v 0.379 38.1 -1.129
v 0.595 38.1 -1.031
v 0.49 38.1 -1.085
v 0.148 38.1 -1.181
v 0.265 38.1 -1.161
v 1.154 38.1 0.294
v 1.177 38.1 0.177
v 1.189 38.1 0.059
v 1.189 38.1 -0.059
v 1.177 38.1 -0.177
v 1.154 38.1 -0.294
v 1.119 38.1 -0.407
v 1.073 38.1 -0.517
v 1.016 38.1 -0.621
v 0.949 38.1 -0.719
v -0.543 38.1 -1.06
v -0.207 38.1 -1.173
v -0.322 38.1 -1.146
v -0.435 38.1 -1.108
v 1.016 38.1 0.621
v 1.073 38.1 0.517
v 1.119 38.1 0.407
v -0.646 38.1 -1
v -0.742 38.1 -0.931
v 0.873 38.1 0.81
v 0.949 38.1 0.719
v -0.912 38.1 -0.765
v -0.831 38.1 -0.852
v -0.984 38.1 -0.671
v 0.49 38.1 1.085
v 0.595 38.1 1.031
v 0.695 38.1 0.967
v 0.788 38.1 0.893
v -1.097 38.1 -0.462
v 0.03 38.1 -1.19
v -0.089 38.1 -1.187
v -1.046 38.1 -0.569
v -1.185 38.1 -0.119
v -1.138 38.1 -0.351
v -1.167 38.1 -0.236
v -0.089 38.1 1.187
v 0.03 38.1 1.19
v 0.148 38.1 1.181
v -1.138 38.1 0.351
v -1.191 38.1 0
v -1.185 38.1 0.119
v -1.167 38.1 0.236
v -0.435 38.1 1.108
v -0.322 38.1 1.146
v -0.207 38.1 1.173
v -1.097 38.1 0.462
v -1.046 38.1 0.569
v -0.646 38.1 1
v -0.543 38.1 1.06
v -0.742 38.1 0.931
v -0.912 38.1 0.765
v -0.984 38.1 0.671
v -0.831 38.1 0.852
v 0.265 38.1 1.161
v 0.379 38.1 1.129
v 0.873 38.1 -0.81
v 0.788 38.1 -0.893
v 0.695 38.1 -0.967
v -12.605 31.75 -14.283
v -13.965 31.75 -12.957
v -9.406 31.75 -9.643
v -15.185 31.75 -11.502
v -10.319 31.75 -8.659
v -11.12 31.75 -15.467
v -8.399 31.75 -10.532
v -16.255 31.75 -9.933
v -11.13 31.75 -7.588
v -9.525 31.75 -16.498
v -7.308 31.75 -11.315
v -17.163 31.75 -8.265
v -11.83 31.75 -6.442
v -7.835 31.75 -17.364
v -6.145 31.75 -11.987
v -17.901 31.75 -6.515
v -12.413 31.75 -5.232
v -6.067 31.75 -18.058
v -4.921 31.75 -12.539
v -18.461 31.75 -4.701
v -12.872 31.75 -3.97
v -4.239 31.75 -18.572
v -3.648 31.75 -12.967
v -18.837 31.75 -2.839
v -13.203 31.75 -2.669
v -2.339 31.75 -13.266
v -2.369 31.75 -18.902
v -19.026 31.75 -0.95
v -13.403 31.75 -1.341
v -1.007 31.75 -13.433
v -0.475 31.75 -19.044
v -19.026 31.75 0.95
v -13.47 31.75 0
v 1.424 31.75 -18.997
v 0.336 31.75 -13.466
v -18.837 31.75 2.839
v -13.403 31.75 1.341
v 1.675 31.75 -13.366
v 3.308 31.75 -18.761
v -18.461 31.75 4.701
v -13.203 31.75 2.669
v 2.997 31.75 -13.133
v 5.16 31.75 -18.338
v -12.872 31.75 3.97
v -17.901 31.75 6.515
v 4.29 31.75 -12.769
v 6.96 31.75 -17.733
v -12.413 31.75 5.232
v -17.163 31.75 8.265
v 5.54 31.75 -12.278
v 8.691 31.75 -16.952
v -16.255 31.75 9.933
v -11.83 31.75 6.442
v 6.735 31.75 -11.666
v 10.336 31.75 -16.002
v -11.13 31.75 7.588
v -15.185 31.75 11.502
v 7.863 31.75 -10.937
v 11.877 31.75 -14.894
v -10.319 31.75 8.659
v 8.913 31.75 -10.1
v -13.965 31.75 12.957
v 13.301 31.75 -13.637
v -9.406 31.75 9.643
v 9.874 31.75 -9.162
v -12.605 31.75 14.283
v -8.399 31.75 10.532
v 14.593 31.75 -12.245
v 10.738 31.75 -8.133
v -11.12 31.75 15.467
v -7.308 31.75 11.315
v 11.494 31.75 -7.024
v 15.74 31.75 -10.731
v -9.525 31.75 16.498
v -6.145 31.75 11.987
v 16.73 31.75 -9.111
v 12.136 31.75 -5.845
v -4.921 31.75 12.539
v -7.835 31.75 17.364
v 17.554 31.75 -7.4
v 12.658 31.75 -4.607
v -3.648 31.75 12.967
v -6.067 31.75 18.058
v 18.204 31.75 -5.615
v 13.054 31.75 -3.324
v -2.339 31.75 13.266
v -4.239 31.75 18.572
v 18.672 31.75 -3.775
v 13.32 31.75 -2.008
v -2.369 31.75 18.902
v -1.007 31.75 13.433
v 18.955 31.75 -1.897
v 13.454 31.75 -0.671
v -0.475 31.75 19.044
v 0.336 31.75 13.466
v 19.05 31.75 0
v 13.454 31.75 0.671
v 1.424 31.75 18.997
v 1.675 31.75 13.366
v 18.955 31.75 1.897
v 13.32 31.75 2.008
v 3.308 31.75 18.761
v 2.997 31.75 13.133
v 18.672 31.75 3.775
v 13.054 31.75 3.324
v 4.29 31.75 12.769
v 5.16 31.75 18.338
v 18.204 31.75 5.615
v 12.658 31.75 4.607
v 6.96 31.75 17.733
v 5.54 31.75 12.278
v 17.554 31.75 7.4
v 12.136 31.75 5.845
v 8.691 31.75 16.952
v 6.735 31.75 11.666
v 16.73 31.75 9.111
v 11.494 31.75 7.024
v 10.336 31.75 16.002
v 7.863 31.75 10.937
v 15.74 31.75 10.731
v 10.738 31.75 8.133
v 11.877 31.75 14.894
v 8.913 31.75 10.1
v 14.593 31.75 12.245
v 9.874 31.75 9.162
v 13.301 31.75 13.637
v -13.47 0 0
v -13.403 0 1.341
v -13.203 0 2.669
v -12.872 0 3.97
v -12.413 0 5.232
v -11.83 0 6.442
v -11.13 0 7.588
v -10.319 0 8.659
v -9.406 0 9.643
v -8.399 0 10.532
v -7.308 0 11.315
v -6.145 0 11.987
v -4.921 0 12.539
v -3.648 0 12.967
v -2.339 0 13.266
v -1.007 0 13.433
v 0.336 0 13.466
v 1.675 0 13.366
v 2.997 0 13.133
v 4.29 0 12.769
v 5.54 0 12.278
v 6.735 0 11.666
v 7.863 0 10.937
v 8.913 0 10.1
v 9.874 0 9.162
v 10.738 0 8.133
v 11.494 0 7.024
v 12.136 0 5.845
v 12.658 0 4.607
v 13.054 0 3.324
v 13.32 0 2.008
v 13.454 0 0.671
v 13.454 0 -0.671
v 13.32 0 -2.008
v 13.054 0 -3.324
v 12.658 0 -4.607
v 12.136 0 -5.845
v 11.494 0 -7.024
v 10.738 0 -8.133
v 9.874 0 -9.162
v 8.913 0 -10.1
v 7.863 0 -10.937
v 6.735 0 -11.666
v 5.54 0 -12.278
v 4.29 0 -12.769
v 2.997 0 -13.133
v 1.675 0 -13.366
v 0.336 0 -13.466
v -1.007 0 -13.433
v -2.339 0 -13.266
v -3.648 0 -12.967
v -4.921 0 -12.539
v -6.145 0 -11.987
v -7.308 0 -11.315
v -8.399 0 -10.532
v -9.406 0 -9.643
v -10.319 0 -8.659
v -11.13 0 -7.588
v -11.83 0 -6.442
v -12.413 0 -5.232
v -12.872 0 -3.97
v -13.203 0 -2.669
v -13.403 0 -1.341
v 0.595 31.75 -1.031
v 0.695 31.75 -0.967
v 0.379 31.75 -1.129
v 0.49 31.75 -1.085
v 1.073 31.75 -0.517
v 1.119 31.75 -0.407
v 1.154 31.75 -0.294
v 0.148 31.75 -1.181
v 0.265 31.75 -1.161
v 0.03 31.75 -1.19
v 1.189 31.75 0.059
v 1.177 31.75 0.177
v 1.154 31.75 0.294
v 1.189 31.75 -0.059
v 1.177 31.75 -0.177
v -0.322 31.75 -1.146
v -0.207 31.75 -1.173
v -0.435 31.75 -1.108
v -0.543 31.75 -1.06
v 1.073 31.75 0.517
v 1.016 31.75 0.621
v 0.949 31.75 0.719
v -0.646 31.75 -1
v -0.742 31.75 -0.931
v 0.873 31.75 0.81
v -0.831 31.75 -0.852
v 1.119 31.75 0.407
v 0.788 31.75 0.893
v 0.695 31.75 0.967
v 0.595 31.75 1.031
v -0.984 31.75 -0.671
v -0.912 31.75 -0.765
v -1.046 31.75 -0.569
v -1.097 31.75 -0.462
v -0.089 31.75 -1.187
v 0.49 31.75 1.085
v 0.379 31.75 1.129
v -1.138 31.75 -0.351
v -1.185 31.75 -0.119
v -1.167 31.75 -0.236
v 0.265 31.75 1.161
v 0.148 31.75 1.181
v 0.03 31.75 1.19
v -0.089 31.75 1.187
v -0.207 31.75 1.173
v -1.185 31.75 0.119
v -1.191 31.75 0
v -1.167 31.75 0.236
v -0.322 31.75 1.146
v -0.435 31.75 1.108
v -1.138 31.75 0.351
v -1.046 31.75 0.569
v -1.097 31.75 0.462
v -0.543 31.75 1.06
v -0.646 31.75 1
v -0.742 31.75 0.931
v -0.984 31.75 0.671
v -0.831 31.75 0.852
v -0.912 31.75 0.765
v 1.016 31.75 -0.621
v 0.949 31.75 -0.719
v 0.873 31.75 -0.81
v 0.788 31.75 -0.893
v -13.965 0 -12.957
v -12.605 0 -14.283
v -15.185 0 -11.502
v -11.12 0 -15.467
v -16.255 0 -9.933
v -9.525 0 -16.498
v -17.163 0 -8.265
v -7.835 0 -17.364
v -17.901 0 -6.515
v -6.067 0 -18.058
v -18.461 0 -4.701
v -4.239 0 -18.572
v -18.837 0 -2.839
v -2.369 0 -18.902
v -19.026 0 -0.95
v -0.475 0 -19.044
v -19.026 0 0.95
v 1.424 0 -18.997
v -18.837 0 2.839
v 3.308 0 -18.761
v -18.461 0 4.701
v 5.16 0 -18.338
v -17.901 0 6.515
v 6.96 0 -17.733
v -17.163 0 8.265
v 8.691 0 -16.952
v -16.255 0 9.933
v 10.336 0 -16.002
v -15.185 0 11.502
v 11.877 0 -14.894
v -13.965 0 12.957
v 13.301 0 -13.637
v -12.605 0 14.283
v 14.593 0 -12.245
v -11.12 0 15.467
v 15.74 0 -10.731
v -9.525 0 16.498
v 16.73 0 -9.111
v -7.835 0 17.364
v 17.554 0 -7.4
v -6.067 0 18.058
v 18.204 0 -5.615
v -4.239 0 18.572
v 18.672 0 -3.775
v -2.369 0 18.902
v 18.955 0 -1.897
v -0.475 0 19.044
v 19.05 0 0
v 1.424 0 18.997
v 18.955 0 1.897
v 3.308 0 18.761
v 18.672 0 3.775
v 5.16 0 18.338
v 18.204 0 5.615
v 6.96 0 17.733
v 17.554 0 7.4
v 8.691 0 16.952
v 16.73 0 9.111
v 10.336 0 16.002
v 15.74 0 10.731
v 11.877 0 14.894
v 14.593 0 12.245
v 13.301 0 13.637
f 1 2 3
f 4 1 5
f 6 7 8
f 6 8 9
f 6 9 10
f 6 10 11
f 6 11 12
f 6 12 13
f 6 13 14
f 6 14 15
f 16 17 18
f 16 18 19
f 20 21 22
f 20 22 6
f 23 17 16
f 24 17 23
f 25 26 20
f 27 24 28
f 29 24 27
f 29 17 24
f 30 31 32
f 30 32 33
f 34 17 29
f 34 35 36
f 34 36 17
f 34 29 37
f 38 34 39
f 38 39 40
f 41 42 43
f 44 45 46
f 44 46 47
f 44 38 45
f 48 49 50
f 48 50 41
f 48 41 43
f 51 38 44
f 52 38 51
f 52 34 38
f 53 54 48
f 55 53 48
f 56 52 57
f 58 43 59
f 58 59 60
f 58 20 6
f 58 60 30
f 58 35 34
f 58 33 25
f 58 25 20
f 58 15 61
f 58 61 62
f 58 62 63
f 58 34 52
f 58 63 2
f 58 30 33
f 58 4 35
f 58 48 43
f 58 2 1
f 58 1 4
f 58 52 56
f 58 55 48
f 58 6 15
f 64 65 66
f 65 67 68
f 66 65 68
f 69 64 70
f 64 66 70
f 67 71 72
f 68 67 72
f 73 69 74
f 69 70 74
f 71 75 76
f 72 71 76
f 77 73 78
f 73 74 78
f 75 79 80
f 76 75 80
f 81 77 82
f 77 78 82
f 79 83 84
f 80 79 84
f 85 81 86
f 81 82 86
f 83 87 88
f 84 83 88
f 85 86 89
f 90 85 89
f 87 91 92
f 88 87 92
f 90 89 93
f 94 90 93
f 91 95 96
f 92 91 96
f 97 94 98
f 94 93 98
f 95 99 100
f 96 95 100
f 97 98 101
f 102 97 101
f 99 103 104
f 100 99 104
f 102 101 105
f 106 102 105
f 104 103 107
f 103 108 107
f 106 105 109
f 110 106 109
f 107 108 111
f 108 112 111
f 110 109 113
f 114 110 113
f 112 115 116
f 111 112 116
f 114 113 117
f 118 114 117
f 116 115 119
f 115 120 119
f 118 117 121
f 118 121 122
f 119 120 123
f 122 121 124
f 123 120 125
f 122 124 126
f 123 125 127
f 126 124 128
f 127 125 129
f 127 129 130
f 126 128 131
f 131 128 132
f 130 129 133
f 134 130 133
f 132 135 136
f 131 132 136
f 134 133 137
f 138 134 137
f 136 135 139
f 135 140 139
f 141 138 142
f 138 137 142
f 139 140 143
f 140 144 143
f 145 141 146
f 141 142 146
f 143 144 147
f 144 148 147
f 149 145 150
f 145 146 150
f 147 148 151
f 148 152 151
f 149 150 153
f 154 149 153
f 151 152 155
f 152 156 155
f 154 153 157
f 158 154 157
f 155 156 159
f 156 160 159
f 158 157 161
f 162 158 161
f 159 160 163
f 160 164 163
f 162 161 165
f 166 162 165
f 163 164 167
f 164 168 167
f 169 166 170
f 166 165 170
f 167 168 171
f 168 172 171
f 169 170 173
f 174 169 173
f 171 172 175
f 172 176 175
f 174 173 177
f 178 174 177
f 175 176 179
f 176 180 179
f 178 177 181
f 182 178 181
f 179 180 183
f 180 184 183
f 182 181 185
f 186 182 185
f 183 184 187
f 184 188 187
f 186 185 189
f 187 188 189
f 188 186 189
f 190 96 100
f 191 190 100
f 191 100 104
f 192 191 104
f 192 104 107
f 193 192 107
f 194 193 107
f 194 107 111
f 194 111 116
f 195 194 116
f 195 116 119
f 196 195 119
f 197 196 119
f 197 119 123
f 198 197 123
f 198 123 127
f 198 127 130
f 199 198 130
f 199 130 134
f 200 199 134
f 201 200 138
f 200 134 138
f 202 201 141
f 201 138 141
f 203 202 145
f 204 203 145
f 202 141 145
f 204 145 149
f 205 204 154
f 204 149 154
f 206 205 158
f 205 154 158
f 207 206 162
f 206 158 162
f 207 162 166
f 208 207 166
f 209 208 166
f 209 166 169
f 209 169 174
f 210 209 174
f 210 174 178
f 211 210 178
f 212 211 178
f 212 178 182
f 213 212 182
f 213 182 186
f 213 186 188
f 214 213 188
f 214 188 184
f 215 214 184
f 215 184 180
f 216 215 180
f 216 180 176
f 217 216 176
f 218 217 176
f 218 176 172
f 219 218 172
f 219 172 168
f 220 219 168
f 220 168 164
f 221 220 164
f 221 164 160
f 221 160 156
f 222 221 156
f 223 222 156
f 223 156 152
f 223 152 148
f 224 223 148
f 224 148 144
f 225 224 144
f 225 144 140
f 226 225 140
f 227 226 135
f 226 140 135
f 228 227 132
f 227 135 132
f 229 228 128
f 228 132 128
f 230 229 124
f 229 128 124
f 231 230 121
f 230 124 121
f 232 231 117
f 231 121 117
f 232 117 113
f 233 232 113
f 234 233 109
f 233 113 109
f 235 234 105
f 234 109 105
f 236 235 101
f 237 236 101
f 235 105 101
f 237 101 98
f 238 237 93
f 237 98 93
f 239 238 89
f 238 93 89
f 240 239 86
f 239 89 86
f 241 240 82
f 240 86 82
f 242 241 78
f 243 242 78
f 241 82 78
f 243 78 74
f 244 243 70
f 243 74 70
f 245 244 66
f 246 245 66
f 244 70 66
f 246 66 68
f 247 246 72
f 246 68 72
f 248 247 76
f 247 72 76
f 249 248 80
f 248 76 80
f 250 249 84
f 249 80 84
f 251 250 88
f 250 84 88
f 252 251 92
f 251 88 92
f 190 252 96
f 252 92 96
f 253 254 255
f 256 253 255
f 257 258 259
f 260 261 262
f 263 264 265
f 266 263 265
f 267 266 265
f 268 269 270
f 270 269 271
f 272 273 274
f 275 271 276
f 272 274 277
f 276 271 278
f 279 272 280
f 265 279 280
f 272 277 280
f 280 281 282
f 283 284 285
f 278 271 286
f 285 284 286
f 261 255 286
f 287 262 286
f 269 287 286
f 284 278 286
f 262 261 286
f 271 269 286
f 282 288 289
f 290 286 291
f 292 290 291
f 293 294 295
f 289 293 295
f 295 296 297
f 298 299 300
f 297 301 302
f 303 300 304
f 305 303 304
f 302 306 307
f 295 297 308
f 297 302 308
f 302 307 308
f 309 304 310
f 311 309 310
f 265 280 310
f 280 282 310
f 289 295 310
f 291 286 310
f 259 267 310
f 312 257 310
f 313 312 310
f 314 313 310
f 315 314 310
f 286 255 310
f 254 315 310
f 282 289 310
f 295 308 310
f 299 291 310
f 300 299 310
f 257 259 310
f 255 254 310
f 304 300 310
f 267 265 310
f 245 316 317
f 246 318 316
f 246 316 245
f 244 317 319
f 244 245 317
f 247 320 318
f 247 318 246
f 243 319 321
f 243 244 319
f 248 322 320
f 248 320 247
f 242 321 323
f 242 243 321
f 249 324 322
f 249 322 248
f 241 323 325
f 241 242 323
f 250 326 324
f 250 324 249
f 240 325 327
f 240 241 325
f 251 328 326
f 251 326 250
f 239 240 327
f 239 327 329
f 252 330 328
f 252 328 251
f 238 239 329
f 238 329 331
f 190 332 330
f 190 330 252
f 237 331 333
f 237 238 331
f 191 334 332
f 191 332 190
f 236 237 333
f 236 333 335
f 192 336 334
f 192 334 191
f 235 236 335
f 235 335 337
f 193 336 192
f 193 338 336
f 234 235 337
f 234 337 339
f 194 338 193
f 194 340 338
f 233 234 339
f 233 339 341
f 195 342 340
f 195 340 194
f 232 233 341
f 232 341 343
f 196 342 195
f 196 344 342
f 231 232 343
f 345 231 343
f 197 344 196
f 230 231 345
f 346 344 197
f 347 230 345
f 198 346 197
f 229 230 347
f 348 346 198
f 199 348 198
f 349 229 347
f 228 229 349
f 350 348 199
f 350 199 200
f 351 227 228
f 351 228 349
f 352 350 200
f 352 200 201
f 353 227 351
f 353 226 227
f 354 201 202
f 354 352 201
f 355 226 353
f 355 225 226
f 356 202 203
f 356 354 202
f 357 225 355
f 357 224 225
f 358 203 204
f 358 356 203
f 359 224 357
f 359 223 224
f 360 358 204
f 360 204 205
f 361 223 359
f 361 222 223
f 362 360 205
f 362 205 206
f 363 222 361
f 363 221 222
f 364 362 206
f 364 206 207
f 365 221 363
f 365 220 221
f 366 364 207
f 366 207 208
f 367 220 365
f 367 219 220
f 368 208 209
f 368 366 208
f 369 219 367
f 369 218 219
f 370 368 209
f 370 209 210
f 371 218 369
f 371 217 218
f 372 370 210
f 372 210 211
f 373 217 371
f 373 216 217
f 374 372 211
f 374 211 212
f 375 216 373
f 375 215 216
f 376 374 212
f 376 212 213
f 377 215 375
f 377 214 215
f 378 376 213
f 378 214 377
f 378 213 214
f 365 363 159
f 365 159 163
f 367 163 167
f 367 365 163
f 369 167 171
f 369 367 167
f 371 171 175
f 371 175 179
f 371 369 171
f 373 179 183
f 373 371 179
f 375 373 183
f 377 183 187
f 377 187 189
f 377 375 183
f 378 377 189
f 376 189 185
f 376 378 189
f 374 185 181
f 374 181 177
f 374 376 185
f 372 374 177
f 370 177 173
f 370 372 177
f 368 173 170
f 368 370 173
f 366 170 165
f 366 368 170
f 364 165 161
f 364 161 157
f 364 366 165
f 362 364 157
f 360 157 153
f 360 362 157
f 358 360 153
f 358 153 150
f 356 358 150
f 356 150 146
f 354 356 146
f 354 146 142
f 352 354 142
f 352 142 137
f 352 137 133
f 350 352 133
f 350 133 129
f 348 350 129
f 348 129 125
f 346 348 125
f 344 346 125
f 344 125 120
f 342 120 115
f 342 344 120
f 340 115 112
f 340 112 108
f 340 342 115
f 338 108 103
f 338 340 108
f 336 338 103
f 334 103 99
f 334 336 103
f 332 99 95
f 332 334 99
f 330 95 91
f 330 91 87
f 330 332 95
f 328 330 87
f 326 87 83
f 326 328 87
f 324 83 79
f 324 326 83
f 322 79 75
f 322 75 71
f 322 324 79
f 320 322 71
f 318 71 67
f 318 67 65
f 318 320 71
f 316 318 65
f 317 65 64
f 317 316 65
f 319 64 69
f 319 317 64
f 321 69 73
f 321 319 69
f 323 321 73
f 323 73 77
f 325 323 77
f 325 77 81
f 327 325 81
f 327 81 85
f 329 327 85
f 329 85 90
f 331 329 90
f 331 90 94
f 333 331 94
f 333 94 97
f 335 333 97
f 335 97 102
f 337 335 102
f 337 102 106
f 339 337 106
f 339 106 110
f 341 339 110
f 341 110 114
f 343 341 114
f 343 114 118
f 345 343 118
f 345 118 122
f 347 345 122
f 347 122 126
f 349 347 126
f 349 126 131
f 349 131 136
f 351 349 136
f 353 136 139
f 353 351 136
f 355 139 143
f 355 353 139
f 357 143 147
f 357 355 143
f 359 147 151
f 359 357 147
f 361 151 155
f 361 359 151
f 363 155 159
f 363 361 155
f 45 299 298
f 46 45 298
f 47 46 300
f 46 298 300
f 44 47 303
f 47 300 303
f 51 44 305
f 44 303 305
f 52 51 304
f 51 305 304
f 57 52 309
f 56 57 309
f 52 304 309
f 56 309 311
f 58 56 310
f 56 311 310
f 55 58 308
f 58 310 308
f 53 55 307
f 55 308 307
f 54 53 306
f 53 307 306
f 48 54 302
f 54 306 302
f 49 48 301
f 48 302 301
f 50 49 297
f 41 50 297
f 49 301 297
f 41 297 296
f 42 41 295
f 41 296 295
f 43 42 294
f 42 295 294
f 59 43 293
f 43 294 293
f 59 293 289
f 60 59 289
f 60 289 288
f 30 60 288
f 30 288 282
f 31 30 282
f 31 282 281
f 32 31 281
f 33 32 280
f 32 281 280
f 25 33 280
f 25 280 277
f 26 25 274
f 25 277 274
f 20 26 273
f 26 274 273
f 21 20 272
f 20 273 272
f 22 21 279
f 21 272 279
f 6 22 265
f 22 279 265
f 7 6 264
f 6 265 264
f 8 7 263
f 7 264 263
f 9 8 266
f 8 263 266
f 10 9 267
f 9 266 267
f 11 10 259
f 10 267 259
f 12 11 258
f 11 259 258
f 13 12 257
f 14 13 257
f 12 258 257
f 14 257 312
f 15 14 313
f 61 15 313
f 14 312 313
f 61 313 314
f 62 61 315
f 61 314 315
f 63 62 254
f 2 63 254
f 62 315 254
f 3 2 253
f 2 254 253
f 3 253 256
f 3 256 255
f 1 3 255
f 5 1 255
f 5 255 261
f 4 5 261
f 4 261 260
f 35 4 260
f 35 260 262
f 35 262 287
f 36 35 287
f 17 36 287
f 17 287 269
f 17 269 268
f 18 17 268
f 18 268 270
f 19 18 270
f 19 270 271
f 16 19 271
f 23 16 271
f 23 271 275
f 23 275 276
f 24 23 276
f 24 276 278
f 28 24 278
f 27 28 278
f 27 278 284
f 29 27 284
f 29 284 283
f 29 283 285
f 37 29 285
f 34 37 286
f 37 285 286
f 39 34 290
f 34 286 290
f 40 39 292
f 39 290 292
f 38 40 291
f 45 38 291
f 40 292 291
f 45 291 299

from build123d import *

# Parameters (mm, degrees)
F0_R     = 19.05
F1_DEPTH = 31.75
F2_R     = 1.190625
F3_DEPTH = 6.35
F5_R     = 13.470383
F6_DEPTH = 38.1


with BuildPart() as f1:
    # F0 (on Front) → F1 (new body)
    with BuildSketch(Plane.XZ):
        Circle(F0_R)
    extrude(amount=-F1_DEPTH)

    # F2 (on face) → F3 (join)
    with BuildSketch(Plane(origin=(0, 31.75, 0), x_dir=(-1, 0, 0), z_dir=(0, 1, 0))):
        Circle(F2_R)
    extrude(amount=F3_DEPTH)

    # F5 (on face) → F6 (cut)
    with BuildSketch(Plane(origin=(0, 31.75, 0), x_dir=(-1, 0, 0), z_dir=(0, 1, 0))):
        Circle(F5_R)
    extrude(amount=-F6_DEPTH, mode=Mode.SUBTRACT)


solid = f1.part
